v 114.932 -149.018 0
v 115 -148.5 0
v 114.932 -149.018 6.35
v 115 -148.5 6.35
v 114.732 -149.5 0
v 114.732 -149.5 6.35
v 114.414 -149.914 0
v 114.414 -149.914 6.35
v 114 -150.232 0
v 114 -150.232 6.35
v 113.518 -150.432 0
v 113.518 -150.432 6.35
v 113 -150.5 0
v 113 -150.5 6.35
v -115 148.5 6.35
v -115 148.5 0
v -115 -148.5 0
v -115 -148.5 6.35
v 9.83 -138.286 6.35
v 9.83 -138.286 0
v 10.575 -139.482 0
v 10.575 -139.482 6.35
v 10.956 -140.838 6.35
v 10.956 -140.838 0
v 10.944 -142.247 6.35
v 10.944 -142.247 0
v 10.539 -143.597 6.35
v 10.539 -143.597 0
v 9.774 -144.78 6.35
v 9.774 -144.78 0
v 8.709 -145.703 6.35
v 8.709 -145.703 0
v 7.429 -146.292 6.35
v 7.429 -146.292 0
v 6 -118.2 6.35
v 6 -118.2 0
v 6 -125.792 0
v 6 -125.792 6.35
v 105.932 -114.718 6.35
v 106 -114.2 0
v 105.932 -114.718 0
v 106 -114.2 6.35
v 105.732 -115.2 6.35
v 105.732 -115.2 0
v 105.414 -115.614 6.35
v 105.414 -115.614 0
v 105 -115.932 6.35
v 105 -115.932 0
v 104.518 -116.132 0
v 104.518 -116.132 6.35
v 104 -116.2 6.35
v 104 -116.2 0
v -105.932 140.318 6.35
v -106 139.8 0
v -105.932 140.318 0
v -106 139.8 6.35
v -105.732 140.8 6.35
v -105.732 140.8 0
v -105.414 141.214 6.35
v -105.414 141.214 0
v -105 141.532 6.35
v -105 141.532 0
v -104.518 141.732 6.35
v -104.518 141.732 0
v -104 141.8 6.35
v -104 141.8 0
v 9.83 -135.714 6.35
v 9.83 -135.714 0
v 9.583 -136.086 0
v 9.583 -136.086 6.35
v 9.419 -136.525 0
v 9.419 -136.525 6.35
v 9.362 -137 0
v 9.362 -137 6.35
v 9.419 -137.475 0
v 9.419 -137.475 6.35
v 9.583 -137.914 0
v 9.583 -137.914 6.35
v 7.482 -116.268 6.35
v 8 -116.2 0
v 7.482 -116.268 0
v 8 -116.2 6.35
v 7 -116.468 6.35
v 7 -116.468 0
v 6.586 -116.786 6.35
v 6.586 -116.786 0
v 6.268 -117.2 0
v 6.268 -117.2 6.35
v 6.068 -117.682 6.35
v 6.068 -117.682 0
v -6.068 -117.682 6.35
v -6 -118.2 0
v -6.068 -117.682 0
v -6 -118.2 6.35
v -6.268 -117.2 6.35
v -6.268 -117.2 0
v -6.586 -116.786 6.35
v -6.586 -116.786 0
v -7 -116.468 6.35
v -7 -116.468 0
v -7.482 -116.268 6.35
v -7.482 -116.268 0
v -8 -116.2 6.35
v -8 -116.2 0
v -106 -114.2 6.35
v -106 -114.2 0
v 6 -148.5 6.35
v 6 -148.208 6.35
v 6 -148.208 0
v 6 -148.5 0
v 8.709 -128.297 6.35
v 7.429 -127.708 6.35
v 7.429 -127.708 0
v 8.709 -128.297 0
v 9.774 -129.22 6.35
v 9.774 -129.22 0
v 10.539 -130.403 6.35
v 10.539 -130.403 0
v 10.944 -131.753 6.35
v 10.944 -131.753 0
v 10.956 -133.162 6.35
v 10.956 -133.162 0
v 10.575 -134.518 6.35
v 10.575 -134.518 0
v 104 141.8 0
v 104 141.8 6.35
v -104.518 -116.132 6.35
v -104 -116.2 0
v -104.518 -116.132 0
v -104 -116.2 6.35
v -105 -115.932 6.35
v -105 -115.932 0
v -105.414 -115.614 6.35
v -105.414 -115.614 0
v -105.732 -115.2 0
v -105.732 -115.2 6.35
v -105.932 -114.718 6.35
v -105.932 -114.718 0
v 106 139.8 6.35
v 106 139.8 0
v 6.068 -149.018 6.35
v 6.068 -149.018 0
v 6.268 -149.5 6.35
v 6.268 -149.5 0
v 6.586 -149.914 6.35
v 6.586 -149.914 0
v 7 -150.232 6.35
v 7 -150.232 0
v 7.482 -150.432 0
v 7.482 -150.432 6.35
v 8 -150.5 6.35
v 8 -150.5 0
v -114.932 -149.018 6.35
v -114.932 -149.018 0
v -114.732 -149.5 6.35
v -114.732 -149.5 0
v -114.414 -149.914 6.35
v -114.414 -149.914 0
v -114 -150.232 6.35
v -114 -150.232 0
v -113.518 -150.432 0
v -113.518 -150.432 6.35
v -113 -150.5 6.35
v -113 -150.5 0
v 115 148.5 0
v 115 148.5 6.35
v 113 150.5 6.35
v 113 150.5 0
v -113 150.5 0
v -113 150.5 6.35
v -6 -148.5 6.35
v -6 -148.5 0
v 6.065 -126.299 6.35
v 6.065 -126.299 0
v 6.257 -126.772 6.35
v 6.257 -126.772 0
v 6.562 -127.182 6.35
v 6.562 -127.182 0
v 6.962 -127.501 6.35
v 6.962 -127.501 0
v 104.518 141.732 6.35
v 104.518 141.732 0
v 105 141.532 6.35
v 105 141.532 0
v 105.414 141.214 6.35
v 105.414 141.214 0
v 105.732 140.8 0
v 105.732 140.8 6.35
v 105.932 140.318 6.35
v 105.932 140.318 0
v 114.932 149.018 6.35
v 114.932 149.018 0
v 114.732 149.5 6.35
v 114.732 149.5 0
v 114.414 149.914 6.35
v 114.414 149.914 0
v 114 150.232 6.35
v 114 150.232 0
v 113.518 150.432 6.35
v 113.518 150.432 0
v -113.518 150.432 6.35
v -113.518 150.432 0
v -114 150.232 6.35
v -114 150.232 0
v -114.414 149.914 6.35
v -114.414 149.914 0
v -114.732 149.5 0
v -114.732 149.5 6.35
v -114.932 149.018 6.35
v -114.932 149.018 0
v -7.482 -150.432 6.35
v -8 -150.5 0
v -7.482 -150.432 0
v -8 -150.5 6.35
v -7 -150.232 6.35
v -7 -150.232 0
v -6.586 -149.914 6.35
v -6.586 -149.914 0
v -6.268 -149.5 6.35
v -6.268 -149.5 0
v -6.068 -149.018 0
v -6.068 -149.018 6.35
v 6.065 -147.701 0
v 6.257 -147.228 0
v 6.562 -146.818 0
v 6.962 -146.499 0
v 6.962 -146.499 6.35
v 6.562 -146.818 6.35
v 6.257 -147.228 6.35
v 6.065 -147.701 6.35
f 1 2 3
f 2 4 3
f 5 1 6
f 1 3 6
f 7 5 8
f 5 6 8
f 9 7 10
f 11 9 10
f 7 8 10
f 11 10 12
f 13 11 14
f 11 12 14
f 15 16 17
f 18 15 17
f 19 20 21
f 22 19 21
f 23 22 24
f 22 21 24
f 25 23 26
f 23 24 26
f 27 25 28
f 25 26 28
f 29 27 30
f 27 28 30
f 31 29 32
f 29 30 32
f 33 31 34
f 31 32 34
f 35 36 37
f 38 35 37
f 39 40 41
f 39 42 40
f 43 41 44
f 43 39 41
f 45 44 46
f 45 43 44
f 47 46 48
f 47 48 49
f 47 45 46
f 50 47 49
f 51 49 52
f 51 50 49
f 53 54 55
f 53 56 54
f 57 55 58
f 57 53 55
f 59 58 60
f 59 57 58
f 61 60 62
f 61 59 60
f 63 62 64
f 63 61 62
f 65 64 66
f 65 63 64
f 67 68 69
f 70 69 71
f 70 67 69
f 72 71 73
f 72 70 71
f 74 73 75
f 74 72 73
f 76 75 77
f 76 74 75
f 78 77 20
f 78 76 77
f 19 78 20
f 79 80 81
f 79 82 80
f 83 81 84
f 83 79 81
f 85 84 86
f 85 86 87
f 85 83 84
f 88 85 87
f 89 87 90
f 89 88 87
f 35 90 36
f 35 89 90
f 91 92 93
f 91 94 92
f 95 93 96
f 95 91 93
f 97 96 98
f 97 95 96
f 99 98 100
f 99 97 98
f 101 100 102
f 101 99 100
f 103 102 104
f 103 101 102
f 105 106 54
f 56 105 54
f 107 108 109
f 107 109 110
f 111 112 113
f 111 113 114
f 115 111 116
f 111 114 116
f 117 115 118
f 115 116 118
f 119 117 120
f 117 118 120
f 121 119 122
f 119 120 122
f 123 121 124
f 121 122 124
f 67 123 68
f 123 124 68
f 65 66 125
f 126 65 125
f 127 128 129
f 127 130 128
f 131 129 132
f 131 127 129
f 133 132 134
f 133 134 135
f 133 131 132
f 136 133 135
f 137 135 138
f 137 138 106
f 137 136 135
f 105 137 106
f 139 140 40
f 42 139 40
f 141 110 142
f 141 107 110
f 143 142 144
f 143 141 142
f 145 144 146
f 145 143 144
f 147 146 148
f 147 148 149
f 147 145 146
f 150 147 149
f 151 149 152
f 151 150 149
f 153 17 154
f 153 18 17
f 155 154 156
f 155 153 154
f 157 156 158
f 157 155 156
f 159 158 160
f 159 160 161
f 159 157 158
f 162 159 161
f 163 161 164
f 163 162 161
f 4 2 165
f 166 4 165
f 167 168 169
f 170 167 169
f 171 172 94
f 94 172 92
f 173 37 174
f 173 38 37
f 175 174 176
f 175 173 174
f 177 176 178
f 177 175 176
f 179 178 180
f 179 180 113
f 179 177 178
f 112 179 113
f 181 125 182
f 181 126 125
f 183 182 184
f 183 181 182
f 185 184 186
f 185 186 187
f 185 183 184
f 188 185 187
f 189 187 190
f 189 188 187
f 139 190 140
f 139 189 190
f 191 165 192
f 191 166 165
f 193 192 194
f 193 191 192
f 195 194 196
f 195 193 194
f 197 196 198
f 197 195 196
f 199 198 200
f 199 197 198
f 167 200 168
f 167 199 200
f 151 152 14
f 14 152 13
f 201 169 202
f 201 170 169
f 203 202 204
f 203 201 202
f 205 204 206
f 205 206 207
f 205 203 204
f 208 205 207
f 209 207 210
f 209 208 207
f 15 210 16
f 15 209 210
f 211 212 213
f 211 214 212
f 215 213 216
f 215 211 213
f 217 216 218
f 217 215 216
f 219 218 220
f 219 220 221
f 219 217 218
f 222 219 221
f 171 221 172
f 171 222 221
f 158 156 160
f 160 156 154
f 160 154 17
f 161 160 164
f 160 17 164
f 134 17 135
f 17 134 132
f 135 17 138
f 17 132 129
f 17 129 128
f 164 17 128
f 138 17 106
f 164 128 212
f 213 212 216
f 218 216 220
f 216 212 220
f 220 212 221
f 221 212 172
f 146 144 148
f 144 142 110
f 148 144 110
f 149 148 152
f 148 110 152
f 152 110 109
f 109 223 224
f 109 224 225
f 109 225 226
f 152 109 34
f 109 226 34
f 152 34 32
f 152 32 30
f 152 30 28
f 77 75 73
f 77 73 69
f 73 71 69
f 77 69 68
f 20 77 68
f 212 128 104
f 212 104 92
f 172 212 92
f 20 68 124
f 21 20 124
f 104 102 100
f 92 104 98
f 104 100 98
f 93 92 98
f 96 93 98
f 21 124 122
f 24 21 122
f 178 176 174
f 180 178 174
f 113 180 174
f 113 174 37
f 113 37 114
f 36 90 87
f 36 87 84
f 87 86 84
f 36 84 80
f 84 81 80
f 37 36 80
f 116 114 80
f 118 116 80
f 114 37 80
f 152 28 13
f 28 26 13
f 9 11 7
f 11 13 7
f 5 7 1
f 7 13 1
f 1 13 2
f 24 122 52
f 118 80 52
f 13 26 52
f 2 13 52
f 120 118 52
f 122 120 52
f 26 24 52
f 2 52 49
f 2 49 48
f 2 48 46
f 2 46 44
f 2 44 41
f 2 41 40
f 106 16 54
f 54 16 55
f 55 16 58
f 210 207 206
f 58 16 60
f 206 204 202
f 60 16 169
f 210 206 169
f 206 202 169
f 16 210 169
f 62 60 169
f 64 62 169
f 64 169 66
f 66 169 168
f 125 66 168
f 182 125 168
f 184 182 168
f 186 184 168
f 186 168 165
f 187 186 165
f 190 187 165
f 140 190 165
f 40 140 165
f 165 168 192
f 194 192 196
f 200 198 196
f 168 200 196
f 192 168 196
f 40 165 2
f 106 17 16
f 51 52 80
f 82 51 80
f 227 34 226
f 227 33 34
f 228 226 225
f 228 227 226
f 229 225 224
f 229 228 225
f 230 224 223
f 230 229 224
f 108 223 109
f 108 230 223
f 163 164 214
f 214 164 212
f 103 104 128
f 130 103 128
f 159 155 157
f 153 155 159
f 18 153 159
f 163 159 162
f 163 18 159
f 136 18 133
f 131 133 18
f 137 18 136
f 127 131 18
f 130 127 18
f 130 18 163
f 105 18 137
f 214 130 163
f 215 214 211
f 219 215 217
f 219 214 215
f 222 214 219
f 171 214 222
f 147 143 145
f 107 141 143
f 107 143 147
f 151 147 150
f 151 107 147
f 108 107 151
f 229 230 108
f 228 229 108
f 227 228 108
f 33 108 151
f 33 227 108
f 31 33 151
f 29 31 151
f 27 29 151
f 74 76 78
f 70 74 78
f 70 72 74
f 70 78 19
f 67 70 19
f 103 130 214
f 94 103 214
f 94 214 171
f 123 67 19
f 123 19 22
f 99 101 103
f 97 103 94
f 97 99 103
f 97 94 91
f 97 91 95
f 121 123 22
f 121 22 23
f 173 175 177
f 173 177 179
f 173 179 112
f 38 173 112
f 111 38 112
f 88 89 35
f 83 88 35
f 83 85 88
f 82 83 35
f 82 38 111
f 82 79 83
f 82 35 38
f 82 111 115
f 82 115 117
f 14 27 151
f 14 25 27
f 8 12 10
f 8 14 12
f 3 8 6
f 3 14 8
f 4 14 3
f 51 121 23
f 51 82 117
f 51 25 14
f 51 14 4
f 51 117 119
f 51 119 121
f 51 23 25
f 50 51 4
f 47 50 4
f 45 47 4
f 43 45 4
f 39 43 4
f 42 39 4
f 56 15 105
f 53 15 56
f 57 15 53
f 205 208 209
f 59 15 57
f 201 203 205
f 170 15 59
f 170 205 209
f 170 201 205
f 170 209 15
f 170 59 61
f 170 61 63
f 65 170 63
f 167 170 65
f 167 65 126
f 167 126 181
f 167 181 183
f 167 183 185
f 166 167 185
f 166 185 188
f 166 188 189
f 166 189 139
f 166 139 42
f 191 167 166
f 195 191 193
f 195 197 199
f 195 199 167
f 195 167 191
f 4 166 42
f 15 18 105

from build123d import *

# Parameters (mm, degrees)
F1_DEPTH = 6.35
F2_R     = 2


# Not quite as in the source:
# - a length typed as a fraction of an inch, garbled in the dataset ("3 / 203.2 mm" for 3/8 in), is restored


with BuildPart() as f1:
    # F0 (on Top) → F1 (new body)
    with BuildSketch(Plane.XY):
        with BuildLine():
            Line((115, -150.5), (115, 150.5))
            Line((115, 150.5), (-115, 150.5))
            Line((-115, 150.5), (-115, -150.5))
            Line((-115, -150.5), (-6, -150.5))
            Line((-6, -150.5), (-6, -116.2))
            Line((-6, -116.2), (-106, -116.2))
            Line((-106, -116.2), (-106, 141.8))
            Line((-106, 141.8), (106, 141.8))
            Line((106, 141.8), (106, -116.2))
            Line((106, -116.2), (6, -116.2))
            Line((6, -116.2), (6, -127.5))
            ThreePointArc((6, -127.5), (10.8733971724, -131.3819660113), (8.1794494718, -137))
            ThreePointArc((8.1794494718, -137), (10.8733971724, -142.6180339887), (6, -146.5))
            Line((6, -146.5), (6, -150.5))
            Line((6, -150.5), (115, -150.5))
        make_face()
    extrude(amount=F1_DEPTH)

    # F2
    f2_edges = [f1.edges().sort_by_distance(p)[0] for p in [
        (115, -150.5, 3.175),
        (115, 150.5, 3.175),
        (6, -116.2, 3.175),
        (-6, -116.2, 3.175),
        (-6, -150.5, 3.175),
        (-106, -116.2, 3.175),
        (-115, 150.5, 3.175),
        (6, -127.5, 3.175),
        (8.179449, -137, 3.175),
        (6, -146.5, 3.175),
        (-115, -150.5, 3.175),
        (106, 141.8, 3.175),
        (106, -116.2, 3.175),
        (-106, 141.8, 3.175),
        (6, -150.5, 3.175),
    ]]
    fillet(f2_edges, radius=F2_R)


solid = f1.part
